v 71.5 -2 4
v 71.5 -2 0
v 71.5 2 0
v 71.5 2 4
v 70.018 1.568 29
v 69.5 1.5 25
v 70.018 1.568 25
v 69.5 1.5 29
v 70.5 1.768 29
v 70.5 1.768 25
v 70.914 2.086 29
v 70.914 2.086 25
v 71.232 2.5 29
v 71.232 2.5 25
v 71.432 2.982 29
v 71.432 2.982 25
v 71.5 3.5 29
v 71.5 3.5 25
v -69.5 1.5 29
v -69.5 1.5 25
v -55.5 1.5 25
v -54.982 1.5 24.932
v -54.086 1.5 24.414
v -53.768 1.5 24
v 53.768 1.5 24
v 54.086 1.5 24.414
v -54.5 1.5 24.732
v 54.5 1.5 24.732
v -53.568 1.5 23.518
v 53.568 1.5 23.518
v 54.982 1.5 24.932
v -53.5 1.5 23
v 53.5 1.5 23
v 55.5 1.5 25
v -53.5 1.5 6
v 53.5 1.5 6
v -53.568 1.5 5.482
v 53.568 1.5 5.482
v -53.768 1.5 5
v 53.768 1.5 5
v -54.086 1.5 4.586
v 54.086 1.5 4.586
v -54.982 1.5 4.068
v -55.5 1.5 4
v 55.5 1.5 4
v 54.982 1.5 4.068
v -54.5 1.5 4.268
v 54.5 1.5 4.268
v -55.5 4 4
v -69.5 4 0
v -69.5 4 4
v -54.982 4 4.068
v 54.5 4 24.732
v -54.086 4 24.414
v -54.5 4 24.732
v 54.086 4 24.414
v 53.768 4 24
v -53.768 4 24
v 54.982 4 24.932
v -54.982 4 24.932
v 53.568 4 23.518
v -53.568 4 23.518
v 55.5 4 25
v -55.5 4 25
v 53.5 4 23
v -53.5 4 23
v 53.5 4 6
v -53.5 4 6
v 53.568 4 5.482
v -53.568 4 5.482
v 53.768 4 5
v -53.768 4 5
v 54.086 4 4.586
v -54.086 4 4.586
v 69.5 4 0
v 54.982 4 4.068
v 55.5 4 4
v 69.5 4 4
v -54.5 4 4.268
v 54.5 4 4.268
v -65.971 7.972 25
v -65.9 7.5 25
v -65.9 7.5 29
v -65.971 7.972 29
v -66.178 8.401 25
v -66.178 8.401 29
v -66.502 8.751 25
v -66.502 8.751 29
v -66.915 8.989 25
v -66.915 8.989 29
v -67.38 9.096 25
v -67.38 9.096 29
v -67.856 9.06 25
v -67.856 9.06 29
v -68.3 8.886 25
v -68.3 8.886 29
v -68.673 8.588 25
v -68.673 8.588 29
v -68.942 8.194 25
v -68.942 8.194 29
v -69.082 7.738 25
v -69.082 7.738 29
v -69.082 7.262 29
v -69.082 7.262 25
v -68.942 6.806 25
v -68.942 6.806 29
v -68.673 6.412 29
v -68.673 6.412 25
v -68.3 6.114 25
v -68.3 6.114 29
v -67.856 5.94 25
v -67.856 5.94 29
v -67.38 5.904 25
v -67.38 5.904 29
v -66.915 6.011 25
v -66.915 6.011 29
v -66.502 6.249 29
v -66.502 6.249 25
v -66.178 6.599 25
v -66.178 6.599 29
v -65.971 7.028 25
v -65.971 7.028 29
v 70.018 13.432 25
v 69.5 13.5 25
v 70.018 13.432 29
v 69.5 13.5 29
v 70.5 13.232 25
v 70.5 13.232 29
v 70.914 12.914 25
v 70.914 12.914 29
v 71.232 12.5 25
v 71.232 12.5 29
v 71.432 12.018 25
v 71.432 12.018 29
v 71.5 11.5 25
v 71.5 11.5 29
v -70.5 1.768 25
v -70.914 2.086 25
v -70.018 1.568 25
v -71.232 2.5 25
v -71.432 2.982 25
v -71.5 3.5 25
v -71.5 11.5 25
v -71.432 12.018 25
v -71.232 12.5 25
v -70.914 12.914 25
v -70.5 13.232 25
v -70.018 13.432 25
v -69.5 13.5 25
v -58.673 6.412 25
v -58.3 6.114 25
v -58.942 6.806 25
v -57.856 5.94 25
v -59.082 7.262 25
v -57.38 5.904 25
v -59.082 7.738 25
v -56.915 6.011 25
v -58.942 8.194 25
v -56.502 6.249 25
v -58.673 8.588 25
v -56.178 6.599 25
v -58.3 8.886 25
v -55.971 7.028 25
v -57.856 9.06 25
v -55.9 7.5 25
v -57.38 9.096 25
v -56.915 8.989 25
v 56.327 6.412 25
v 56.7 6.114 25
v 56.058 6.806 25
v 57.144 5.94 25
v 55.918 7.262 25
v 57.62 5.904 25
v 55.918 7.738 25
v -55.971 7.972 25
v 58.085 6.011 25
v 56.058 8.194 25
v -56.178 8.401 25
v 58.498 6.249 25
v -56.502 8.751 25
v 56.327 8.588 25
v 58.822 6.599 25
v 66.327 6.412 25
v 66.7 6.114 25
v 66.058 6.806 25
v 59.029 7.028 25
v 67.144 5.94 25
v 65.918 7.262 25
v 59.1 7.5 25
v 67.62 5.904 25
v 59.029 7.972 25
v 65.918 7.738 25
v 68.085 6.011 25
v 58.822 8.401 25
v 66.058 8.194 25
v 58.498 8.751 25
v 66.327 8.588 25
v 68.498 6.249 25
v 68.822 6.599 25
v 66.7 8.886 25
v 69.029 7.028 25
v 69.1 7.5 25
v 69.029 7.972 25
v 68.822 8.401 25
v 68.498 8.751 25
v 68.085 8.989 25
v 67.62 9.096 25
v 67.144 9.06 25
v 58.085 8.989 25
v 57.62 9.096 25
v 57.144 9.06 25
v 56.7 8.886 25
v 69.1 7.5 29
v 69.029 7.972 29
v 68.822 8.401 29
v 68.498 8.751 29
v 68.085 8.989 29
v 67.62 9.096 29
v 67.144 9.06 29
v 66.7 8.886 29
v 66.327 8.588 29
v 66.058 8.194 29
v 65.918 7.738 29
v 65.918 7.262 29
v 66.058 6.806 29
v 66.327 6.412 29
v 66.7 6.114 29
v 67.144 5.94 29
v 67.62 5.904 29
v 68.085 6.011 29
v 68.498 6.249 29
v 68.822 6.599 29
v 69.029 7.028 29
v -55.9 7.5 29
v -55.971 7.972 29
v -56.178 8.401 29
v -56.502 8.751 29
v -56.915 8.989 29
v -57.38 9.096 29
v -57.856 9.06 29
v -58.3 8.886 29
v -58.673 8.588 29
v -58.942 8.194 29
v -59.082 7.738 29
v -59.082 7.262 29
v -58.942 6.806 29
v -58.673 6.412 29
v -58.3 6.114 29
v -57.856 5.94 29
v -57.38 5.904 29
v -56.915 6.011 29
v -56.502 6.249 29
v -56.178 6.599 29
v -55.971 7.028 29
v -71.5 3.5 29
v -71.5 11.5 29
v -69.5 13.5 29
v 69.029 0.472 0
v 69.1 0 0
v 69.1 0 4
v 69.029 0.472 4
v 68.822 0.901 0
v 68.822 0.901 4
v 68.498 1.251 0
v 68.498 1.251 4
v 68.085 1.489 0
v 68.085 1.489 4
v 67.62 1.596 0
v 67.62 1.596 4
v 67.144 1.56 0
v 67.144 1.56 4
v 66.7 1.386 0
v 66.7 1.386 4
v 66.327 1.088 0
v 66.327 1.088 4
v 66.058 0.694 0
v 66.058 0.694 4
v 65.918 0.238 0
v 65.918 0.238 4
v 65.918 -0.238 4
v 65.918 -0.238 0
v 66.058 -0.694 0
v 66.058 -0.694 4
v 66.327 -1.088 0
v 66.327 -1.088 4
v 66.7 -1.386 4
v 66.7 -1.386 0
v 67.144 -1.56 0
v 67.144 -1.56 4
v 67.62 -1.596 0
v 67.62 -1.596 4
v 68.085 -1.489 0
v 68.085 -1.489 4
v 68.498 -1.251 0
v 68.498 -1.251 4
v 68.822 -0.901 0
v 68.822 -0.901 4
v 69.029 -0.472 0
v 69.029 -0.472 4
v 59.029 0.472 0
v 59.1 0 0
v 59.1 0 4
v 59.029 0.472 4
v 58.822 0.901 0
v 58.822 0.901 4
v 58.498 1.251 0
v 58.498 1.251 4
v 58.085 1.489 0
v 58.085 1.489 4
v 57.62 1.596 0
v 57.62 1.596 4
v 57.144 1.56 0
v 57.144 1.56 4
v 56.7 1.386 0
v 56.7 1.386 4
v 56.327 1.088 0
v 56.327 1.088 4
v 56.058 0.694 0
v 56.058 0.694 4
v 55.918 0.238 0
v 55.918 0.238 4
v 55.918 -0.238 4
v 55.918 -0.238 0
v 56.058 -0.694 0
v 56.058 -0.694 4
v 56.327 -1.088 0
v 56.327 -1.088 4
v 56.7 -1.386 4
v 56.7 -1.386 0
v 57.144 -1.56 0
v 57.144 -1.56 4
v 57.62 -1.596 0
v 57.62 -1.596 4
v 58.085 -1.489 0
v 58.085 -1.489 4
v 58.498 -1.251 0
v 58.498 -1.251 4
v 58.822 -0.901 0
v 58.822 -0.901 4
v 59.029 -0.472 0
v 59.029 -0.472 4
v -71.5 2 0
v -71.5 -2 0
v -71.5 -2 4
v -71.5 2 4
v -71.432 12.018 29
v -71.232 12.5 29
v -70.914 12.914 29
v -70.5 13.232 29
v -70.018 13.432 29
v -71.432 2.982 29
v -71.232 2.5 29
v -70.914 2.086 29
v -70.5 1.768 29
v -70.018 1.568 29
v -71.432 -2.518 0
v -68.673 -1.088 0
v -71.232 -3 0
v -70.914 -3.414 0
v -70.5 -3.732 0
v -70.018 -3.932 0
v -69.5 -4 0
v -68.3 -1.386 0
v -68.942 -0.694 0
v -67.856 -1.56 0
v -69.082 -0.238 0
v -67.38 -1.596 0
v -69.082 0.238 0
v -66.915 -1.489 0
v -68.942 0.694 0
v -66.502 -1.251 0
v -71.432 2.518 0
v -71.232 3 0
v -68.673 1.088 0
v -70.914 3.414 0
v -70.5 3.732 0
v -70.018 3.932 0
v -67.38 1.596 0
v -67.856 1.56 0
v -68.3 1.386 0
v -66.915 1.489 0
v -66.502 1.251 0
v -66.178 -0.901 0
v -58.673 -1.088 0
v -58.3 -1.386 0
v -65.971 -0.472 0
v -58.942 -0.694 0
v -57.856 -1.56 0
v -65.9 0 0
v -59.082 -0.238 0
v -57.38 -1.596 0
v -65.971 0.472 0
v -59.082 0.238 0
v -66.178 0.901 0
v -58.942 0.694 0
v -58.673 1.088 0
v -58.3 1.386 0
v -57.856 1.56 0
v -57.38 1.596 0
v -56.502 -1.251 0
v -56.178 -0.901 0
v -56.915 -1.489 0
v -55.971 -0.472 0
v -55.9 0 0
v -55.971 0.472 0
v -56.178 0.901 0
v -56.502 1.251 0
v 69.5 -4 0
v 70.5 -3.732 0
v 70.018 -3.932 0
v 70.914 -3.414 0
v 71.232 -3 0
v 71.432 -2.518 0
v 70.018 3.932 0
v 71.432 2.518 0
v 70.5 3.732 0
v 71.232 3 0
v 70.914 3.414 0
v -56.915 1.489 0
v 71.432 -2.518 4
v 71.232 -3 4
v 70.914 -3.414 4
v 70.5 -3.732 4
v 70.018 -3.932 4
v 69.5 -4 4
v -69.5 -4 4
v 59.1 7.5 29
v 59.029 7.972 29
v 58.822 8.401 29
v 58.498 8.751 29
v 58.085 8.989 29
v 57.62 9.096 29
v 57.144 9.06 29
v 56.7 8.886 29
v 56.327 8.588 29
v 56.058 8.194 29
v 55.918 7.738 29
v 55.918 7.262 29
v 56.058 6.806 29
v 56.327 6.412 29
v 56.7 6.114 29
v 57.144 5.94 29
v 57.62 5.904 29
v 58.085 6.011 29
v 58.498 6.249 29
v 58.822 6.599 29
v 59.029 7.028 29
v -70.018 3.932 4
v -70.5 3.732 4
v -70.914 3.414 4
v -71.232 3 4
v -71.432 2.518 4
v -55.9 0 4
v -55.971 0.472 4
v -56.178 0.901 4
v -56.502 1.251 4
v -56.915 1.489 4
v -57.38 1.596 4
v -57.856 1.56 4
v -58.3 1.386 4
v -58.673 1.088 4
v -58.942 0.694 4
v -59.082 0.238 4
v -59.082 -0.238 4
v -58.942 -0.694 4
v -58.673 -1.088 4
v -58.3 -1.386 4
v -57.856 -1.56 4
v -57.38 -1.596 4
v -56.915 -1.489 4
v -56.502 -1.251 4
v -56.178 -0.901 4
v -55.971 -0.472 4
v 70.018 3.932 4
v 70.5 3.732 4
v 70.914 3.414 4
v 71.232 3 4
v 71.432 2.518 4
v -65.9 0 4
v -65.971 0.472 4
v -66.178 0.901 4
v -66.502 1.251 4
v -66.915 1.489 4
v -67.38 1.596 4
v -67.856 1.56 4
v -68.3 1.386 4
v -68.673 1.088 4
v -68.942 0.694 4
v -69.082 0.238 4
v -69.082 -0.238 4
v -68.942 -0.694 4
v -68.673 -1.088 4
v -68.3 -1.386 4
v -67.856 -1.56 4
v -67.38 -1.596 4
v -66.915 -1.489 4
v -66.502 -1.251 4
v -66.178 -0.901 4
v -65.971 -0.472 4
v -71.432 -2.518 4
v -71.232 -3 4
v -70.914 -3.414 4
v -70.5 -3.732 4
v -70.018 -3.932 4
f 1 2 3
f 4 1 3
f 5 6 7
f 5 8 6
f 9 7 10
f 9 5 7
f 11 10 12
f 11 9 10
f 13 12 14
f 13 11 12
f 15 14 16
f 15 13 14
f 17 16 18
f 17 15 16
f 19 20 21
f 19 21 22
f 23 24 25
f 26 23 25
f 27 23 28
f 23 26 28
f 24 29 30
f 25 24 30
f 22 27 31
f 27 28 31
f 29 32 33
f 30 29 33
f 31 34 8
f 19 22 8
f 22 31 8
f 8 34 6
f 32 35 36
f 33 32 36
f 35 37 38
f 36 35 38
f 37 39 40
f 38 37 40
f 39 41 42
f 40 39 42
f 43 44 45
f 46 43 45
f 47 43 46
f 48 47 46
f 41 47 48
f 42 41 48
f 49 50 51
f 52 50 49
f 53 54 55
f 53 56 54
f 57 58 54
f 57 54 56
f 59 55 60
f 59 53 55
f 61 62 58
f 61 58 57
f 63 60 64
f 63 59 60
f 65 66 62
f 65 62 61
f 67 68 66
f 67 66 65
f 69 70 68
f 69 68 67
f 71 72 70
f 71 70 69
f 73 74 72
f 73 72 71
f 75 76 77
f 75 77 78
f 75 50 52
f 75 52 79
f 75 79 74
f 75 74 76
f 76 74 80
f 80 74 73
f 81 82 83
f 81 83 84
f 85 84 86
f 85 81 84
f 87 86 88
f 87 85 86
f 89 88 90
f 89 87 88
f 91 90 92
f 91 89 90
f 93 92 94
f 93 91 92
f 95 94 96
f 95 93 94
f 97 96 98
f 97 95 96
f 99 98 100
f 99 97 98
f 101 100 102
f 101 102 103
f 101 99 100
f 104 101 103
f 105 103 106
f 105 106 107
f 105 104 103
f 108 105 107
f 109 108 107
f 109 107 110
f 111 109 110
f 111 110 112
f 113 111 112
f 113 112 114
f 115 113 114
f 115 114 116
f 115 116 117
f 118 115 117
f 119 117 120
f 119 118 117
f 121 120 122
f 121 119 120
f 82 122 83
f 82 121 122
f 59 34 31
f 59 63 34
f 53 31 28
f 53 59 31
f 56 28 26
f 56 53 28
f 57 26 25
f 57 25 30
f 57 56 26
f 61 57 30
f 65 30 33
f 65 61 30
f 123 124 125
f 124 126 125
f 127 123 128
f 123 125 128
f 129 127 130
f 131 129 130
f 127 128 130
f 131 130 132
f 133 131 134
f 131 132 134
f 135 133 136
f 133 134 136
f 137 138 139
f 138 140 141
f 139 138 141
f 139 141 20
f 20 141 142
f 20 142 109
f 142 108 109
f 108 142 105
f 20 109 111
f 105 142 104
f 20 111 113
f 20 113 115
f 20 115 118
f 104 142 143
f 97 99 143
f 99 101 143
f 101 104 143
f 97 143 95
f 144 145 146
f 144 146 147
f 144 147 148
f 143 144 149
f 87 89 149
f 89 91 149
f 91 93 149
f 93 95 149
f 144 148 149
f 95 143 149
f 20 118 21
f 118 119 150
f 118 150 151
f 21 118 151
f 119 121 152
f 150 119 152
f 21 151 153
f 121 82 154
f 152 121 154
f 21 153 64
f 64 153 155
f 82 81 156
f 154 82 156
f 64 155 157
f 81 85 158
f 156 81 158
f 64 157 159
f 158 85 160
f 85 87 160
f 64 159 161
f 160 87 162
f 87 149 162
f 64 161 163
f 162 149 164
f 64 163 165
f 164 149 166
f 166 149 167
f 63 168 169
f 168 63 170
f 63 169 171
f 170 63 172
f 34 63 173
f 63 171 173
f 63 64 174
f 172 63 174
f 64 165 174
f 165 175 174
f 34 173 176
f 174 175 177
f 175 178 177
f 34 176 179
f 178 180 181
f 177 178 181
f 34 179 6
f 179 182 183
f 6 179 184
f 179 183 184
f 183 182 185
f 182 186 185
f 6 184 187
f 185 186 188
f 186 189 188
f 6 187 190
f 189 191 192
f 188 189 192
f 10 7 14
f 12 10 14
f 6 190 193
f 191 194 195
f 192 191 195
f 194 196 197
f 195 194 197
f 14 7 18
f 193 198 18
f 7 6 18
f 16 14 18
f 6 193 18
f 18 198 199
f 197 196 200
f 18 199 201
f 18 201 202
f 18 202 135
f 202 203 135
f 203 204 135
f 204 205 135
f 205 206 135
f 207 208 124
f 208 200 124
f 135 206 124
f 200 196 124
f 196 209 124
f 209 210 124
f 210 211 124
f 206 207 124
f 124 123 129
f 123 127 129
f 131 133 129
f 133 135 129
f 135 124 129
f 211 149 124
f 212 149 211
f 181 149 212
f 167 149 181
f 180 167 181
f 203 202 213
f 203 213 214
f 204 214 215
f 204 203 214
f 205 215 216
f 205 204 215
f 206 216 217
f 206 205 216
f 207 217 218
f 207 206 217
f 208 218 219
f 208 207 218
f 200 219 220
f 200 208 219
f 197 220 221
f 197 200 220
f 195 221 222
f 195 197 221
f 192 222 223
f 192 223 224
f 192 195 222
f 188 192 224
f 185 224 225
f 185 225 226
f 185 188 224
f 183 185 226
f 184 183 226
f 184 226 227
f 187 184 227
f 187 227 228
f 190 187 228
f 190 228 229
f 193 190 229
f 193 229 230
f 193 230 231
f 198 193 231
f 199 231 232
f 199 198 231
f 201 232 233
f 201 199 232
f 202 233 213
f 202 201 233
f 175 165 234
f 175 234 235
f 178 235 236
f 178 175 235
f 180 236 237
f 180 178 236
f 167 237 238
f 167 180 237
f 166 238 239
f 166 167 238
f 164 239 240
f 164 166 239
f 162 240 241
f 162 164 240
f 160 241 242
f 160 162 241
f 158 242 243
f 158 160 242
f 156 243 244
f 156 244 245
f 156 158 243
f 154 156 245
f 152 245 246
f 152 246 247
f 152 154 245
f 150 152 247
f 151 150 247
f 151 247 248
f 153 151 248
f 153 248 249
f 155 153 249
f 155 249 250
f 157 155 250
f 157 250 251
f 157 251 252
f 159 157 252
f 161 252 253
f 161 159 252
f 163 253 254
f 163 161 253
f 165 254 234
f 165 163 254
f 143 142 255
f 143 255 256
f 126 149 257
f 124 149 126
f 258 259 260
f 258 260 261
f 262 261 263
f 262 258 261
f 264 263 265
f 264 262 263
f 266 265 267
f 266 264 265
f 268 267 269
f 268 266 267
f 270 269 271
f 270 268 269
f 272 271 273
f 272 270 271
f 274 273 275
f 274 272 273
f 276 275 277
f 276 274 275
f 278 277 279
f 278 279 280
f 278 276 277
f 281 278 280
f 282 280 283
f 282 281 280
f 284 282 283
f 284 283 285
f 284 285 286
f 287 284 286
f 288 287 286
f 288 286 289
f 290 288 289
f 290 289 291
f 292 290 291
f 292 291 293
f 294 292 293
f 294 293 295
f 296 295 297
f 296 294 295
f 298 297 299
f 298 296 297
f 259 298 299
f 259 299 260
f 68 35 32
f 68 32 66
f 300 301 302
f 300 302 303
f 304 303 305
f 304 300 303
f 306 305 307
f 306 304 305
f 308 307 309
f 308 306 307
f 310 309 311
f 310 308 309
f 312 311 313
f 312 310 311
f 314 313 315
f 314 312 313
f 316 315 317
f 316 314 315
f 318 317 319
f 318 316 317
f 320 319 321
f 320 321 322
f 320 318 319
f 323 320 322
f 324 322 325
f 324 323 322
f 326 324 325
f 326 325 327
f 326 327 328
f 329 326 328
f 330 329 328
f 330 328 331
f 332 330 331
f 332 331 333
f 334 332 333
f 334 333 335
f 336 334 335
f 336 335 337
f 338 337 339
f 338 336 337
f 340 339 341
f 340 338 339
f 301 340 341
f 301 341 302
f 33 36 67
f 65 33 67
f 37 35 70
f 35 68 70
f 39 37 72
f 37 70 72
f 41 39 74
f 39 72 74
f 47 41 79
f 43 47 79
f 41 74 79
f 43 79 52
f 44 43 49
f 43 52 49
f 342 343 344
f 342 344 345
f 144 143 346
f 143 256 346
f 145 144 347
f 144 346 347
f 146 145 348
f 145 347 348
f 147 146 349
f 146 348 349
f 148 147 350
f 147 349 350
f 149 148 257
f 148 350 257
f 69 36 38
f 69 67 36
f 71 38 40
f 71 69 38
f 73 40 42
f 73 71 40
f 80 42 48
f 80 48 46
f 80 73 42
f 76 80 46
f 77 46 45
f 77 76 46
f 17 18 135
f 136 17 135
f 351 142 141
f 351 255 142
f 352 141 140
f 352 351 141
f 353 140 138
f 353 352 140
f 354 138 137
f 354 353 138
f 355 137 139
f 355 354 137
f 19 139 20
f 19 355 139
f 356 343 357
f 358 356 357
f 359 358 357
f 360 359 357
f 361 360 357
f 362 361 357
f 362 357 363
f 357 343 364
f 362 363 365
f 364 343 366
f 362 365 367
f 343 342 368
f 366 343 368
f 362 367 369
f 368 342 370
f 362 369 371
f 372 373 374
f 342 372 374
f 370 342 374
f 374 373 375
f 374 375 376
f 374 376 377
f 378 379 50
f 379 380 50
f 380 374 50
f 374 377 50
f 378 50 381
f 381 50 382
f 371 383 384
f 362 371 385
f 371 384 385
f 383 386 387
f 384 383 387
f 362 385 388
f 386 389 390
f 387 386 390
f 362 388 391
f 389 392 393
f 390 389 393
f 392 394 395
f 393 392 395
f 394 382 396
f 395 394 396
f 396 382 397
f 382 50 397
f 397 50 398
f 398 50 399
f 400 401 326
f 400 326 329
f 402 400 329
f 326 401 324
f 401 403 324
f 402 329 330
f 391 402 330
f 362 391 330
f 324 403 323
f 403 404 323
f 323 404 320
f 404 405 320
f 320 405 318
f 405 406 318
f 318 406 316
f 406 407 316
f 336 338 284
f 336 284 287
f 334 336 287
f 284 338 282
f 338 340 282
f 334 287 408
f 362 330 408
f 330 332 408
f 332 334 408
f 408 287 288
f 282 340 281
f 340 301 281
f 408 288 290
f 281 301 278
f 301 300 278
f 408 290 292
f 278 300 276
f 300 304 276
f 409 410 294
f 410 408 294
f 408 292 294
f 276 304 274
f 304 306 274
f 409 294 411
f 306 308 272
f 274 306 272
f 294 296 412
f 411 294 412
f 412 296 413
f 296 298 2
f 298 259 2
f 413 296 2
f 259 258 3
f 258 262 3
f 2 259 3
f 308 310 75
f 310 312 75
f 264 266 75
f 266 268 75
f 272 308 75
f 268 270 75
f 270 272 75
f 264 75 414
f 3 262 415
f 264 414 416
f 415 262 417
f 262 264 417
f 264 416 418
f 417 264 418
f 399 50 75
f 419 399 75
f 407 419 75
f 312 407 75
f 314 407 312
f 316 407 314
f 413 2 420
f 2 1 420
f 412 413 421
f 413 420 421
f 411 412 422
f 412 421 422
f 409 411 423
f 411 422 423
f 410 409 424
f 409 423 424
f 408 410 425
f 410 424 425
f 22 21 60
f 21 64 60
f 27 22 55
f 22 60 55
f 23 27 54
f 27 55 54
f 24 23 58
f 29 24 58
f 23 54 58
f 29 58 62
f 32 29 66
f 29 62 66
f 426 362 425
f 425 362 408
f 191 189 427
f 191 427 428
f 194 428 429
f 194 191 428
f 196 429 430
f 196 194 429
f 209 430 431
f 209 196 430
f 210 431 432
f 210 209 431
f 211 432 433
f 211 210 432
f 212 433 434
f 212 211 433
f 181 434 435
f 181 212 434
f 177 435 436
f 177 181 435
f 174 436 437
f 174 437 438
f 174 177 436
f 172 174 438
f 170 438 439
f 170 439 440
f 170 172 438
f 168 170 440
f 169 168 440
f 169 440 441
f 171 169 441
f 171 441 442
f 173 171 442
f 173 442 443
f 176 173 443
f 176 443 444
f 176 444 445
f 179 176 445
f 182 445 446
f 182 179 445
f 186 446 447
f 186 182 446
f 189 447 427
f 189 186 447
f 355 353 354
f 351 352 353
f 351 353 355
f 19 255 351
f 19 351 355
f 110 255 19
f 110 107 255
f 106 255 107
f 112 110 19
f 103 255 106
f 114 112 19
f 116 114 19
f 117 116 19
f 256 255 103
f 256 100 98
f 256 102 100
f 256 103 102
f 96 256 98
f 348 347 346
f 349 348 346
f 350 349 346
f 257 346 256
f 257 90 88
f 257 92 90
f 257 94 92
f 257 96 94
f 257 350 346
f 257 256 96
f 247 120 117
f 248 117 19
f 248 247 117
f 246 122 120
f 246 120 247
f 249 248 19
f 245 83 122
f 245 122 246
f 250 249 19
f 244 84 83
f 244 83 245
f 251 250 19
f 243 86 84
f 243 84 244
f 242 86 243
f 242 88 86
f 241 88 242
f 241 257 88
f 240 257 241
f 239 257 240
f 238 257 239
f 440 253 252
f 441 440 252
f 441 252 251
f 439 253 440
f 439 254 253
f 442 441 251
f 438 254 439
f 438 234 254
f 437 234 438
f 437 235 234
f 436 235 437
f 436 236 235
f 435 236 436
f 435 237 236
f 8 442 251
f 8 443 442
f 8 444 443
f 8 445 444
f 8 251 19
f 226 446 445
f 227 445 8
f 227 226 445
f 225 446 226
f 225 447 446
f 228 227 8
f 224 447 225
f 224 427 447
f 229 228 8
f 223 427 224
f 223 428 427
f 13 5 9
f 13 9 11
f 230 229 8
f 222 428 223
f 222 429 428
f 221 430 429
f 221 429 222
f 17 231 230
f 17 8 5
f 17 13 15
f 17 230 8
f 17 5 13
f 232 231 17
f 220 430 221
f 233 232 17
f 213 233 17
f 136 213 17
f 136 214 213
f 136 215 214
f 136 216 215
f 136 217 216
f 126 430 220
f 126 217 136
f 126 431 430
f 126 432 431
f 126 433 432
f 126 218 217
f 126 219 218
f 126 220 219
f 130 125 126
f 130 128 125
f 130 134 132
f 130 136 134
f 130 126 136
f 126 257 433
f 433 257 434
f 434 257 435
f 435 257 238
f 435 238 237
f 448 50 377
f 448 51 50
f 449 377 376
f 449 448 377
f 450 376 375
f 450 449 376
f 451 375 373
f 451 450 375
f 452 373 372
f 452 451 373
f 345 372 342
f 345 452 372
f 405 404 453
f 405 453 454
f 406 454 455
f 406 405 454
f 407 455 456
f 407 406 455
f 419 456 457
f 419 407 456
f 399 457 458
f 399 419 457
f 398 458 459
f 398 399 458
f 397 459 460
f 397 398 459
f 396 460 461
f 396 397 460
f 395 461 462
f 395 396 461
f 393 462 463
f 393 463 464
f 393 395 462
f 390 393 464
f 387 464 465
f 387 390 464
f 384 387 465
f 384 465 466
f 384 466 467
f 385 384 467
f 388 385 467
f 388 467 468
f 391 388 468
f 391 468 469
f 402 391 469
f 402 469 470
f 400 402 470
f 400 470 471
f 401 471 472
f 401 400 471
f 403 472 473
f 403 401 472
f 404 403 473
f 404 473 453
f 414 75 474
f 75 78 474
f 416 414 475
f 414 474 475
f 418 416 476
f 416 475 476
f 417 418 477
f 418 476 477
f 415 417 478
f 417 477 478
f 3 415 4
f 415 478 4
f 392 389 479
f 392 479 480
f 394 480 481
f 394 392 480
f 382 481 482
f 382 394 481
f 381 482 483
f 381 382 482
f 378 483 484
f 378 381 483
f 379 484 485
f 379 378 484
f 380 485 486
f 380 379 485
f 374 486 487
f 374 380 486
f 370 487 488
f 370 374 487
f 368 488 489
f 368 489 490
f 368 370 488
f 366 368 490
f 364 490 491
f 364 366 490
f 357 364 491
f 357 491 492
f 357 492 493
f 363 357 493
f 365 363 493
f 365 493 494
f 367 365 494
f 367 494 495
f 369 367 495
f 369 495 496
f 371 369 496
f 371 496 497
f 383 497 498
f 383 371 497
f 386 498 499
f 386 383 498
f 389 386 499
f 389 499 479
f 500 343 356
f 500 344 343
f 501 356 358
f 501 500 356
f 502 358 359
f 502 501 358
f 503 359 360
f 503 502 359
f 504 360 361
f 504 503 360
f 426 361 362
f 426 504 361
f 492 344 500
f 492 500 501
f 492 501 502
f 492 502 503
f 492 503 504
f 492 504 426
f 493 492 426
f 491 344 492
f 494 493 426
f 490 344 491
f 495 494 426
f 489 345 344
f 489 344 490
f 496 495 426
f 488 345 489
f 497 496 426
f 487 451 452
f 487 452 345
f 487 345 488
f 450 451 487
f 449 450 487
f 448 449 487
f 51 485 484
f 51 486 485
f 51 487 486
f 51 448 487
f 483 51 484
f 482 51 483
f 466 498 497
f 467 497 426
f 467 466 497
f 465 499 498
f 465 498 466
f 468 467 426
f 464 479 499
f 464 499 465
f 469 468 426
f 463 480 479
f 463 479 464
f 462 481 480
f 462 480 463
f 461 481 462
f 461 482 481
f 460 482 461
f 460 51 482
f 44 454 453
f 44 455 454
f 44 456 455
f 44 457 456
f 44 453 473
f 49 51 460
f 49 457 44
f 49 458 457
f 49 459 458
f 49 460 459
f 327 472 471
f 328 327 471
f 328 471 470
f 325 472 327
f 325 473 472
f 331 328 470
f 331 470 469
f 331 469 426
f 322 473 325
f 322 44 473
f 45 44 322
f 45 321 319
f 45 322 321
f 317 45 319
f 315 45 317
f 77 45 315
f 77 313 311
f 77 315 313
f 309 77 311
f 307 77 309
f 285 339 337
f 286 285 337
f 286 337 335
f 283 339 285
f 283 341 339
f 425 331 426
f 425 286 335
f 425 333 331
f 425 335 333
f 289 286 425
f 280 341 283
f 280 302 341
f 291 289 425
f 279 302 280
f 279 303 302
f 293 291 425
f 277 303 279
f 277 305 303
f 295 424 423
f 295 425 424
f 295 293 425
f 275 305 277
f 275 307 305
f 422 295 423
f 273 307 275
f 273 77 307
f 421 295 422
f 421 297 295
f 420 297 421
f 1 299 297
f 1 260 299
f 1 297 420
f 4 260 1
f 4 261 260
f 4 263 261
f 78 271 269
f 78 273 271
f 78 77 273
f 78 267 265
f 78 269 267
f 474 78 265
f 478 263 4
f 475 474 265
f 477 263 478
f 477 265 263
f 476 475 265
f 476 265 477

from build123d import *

# Parameters (mm, degrees)
SKETCH_1_W      = 143
SKETCH_1_H      = 8
SKETCH_1_R      = 1.6
EXTRUDE_1_DEPTH = 4
SKETCH_2_W      = 107
SKETCH_2_H      = 2.5
EXTRUDE_2_DEPTH = 21
SKETCH_3_W      = 143
SKETCH_3_H      = 12
SKETCH_3_R      = 1.6
EXTRUDE_4_DEPTH = 4
FILLET_1_R      = 2


with BuildPart() as part:
    # 草图1 → 凸台-拉伸1 (new body)
    with BuildSketch(Plane.XY):
        Rectangle(SKETCH_1_W, SKETCH_1_H)
        with Locations((-67.5, 0)):
            Circle(SKETCH_1_R, mode=Mode.SUBTRACT)
        with Locations((-57.5, 0)):
            Circle(SKETCH_1_R, mode=Mode.SUBTRACT)
        with Locations((57.5, 0)):
            Circle(SKETCH_1_R, mode=Mode.SUBTRACT)
        with Locations((67.5, 0)):
            Circle(SKETCH_1_R, mode=Mode.SUBTRACT)
    extrude(amount=EXTRUDE_1_DEPTH)

    # 草图2 → 凸台-拉伸2 (add)
    with BuildSketch(Plane.XY.offset(4)):
        with Locations((0, 2.75)):
            Rectangle(SKETCH_2_W, SKETCH_2_H)
    extrude(amount=EXTRUDE_2_DEPTH)

    # 草图3 → 凸台-拉伸4 (add)
    with BuildSketch(Plane.XY.offset(25)):
        with Locations((0, 7.5)):
            Rectangle(SKETCH_3_W, SKETCH_3_H)
        with Locations((67.5, 7.5)):
            Circle(SKETCH_3_R, mode=Mode.SUBTRACT)
        with Locations((57.5, 7.5)):
            Circle(SKETCH_3_R, mode=Mode.SUBTRACT)
        with Locations((-67.5, 7.5)):
            Circle(SKETCH_3_R, mode=Mode.SUBTRACT)
        with Locations((-57.5, 7.5)):
            Circle(SKETCH_3_R, mode=Mode.SUBTRACT)
    extrude(amount=EXTRUDE_4_DEPTH)

    # 圆角1
    fillet_1_edges = [part.edges().sort_by_distance(p)[0] for p in [
        (53.5, 2.75, 25),
        (-53.5, 2.75, 4),
        (-53.5, 2.75, 25),
        (53.5, 2.75, 4),
        (-71.5, 13.5, 27),
        (-71.5, 1.5, 27),
        (71.5, 1.5, 27),
        (71.5, 13.5, 27),
        (71.5, -4, 2),
        (-71.5, -4, 2),
        (-71.5, 4, 2),
        (71.5, 4, 2),
    ]]
    fillet(fillet_1_edges, radius=FILLET_1_R)


solid = part.part
